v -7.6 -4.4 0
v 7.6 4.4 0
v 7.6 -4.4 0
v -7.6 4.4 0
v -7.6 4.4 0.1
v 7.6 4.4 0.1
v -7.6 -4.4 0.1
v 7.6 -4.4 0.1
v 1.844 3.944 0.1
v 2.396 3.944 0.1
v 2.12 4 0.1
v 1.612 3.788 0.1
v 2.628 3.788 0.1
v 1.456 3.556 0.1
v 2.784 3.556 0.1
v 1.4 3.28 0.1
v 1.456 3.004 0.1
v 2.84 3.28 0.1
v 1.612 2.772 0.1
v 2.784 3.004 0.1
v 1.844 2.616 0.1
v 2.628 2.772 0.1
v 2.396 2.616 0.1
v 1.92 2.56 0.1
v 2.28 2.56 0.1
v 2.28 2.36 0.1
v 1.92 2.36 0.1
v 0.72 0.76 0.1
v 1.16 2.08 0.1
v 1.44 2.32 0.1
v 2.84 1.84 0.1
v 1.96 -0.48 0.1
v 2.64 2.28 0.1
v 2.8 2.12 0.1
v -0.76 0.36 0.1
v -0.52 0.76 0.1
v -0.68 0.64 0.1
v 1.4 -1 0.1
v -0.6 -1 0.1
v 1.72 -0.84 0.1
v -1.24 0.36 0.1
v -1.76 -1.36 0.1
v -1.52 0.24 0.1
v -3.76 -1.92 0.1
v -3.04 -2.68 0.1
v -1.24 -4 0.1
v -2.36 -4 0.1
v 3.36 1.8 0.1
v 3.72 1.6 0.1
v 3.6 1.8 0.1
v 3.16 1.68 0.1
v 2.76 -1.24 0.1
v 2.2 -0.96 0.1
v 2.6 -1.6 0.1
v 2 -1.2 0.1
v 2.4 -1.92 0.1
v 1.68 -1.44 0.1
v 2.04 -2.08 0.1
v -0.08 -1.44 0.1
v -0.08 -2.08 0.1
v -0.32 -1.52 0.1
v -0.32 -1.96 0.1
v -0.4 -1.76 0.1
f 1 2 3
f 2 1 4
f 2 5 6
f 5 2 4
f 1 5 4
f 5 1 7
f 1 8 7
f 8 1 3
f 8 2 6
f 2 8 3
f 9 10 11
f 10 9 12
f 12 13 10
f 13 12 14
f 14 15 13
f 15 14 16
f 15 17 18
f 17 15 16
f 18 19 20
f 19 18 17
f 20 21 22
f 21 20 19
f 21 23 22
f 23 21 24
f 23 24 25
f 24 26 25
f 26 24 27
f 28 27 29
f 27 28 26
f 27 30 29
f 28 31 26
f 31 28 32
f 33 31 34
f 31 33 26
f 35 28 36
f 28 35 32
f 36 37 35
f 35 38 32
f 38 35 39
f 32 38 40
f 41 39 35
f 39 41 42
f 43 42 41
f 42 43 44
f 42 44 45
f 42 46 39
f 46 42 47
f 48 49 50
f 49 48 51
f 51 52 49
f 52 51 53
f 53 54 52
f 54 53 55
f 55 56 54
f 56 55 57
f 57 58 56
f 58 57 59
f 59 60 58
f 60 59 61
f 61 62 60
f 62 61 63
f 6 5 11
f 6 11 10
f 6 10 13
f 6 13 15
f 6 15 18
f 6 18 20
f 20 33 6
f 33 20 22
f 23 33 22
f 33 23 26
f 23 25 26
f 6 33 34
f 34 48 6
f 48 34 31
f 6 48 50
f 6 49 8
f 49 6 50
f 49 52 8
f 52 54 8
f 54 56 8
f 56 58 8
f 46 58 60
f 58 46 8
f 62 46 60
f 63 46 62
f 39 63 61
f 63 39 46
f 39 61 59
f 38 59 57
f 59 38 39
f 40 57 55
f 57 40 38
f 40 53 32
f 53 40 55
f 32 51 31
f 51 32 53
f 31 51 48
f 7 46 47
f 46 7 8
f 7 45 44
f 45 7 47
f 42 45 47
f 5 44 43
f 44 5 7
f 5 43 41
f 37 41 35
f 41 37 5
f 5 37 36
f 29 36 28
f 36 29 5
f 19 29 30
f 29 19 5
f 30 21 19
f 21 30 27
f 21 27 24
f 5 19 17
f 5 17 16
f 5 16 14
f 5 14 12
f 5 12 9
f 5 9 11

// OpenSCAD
// file: ../p/box5-12.scad
use <../lib.scad>
function ldraw_lib__box5_12() = [
// 0 Box with 5 Faces without Any Edges
// 0 Name: box5-12.dat
// 0 Author: Chris Dee [cwdee]
// 0 !LDRAW_ORG Primitive UPDATE 2009-02
// 0 !LICENSE Licensed under CC BY 4.0 : see CAreadme.txt
// 
// 0 BFC CERTIFY CCW
  [0,"BFC","CERTIFY"],
  [0,"BFC","CCW"],
// 
// 0 !HISTORY 2009-09-03 [PTadmin] Official Update 2009-02
// 
// 
// 4 16 1 1 1 1 1 -1 -1 1 -1 -1 1 1
  [4,16,1,1,1,1,1,-1,-1,1,-1,-1,1,1],
// 4 16 -1 0 1 1 0 1 1 1 1 -1 1 1
  [4,16,-1,0,1,1,0,1,1,1,1,-1,1,1],
// 4 16 -1 0 -1 -1 0 1 -1 1 1 -1 1 -1
  [4,16,-1,0,-1,-1,0,1,-1,1,1,-1,1,-1],
// 4 16 1 0 -1 -1 0 -1 -1 1 -1 1 1 -1
  [4,16,1,0,-1,-1,0,-1,-1,1,-1,1,1,-1],
// 4 16 1 0 1 1 0 -1 1 1 -1 1 1 1
  [4,16,1,0,1,1,0,-1,1,1,-1,1,1,1],
// 0
];
module ldraw_lib__box5_12(step=0, col=false, unit=2/5, alt=false, line=0.2, solid=!$preview)
    makepoly(ldraw_lib__box5_12(), step=step, col=col, unit=unit, alt=alt, line=line, solid=solid);
ldraw_lib__box5_12(line=0.2);
// main file
use <../lib.scad>
use <../p/box5-12.scad>
function ldraw_lib__164555c() = [
// 0 Sticker  1.1 x  1.9 with Black Waiting Room Pictogram on Transparent Background
// 0 Name: 164555c.dat
// 0 Author: Takeshi Takahashi [RainbowDolphin]
// 0 !LDRAW_ORG Part UPDATE 2022-06
// 0 !LICENSE Licensed under CC BY 4.0 : see CAreadme.txt
// 
// 0 BFC CERTIFY CCW
  [0,"BFC","CERTIFY"],
  [0,"BFC","CCW"],
// 
// 0 !KEYWORDS Bricklink 4554stk01, Brickowl 156966, Rebrickable 164555, Set 4554
// 0 !KEYWORDS Station, Train
// 
// 0 !HISTORY 2022-12-20 [PTadmin] Official Update 2022-06
// 
// 
// 1 16 0 -0.25 0 19 0 0 0 0.25 0 0 0 11 box5-12.dat
  [1,16,0,-0.25,0,19,0,0,0,0.25,0,0,0,11, ldraw_lib__box5_12()],
// 0 BFC NOCLIP
  [0,"BFC","NOCLIP"],
// 4 0 5.99 -0.25 9.86 5.3 -0.25 10 4.61 -0.25 9.86 4.03 -0.25 9.47
  [4,0,5.99,-0.25,9.86,5.3,-0.25,10,4.61,-0.25,9.86,4.03,-0.25,9.47],
// 4 0 6.57 -0.25 9.47 5.99 -0.25 9.86 4.03 -0.25 9.47 3.64 -0.25 8.89
  [4,0,6.57,-0.25,9.47,5.99,-0.25,9.86,4.03,-0.25,9.47,3.64,-0.25,8.89],
// 4 0 6.96 -0.25 8.89 6.57 -0.25 9.47 3.64 -0.25 8.89 3.5 -0.25 8.2
  [4,0,6.96,-0.25,8.89,6.57,-0.25,9.47,3.64,-0.25,8.89,3.5,-0.25,8.2],
// 4 0 7.1 -0.25 8.2 6.96 -0.25 8.89 3.5 -0.25 8.2 3.64 -0.25 7.51
  [4,0,7.1,-0.25,8.2,6.96,-0.25,8.89,3.5,-0.25,8.2,3.64,-0.25,7.51],
// 4 0 6.96 -0.25 7.51 7.1 -0.25 8.2 3.64 -0.25 7.51 4.03 -0.25 6.93
  [4,0,6.96,-0.25,7.51,7.1,-0.25,8.2,3.64,-0.25,7.51,4.03,-0.25,6.93],
// 4 0 6.57 -0.25 6.93 6.96 -0.25 7.51 4.03 -0.25 6.93 4.61 -0.25 6.54
  [4,0,6.57,-0.25,6.93,6.96,-0.25,7.51,4.03,-0.25,6.93,4.61,-0.25,6.54],
// 4 0 5.99 -0.25 6.54 6.57 -0.25 6.93 4.61 -0.25 6.54 4.8 -0.25 6.4
  [4,0,5.99,-0.25,6.54,6.57,-0.25,6.93,4.61,-0.25,6.54,4.8,-0.25,6.4],
// 3 0 5.99 -0.25 6.54 4.8 -0.25 6.4 5.7 -0.25 6.4
  [3,0,5.99,-0.25,6.54,4.8,-0.25,6.4,5.7,-0.25,6.4],
// 4 0 5.7 -0.25 6.4 4.8 -0.25 6.4 4.8 -0.25 5.9 5.7 -0.25 5.9
  [4,0,5.7,-0.25,6.4,4.8,-0.25,6.4,4.8,-0.25,5.9,5.7,-0.25,5.9],
// 4 0 1.8 -0.25 1.9 5.7 -0.25 5.9 4.8 -0.25 5.9 2.9 -0.25 5.2
  [4,0,1.8,-0.25,1.9,5.7,-0.25,5.9,4.8,-0.25,5.9,2.9,-0.25,5.2],
// 3 0 4.8 -0.25 5.9 3.6 -0.25 5.8 2.9 -0.25 5.2
  [3,0,4.8,-0.25,5.9,3.6,-0.25,5.8,2.9,-0.25,5.2],
// 4 0 5.7 -0.25 5.9 1.8 -0.25 1.9 4.9 -0.25 -1.2 7.1 -0.25 4.6
  [4,0,5.7,-0.25,5.9,1.8,-0.25,1.9,4.9,-0.25,-1.2,7.1,-0.25,4.6],
// 4 0 5.7 -0.25 5.9 7.1 -0.25 4.6 7 -0.25 5.3 6.6 -0.25 5.7
  [4,0,5.7,-0.25,5.9,7.1,-0.25,4.6,7,-0.25,5.3,6.6,-0.25,5.7],
// 4 0 -1.9 -0.25 0.9 4.9 -0.25 -1.2 1.8 -0.25 1.9 -1.3 -0.25 1.9
  [4,0,-1.9,-0.25,0.9,4.9,-0.25,-1.2,1.8,-0.25,1.9,-1.3,-0.25,1.9],
// 3 0 -1.3 -0.25 1.9 -1.7 -0.25 1.6 -1.9 -0.25 0.9
  [3,0,-1.3,-0.25,1.9,-1.7,-0.25,1.6,-1.9,-0.25,0.9],
// 4 0 4.9 -0.25 -1.2 -1.9 -0.25 0.9 -1.5 -0.25 -2.5 3.5 -0.25 -2.5
  [4,0,4.9,-0.25,-1.2,-1.9,-0.25,0.9,-1.5,-0.25,-2.5,3.5,-0.25,-2.5],
// 3 0 4.9 -0.25 -1.2 3.5 -0.25 -2.5 4.3 -0.25 -2.1
  [3,0,4.9,-0.25,-1.2,3.5,-0.25,-2.5,4.3,-0.25,-2.1],
// 4 0 -4.4 -0.25 -3.4 -1.5 -0.25 -2.5 -1.9 -0.25 0.9 -3.1 -0.25 0.9
  [4,0,-4.4,-0.25,-3.4,-1.5,-0.25,-2.5,-1.9,-0.25,0.9,-3.1,-0.25,0.9],
// 4 0 -4.4 -0.25 -3.4 -3.1 -0.25 0.9 -3.8 -0.25 0.6 -9.4 -0.25 -4.8
  [4,0,-4.4,-0.25,-3.4,-3.1,-0.25,0.9,-3.8,-0.25,0.6,-9.4,-0.25,-4.8],
// 3 0 -4.4 -0.25 -3.4 -9.4 -0.25 -4.8 -7.6 -0.25 -6.7
  [3,0,-4.4,-0.25,-3.4,-9.4,-0.25,-4.8,-7.6,-0.25,-6.7],
// 4 0 -3.1 -0.25 -10 -1.5 -0.25 -2.5 -4.4 -0.25 -3.4 -5.9 -0.25 -10
  [4,0,-3.1,-0.25,-10,-1.5,-0.25,-2.5,-4.4,-0.25,-3.4,-5.9,-0.25,-10],
// 4 0 9.3 -0.25 4 9 -0.25 4.5 8.4 -0.25 4.5 7.9 -0.25 4.2
  [4,0,9.3,-0.25,4,9,-0.25,4.5,8.4,-0.25,4.5,7.9,-0.25,4.2],
// 4 0 9.3 -0.25 4 7.9 -0.25 4.2 5.5 -0.25 -2.4 6.9 -0.25 -3.1
  [4,0,9.3,-0.25,4,7.9,-0.25,4.2,5.5,-0.25,-2.4,6.9,-0.25,-3.1],
// 4 0 6.9 -0.25 -3.1 5.5 -0.25 -2.4 5 -0.25 -3 6.5 -0.25 -4
  [4,0,6.9,-0.25,-3.1,5.5,-0.25,-2.4,5,-0.25,-3,6.5,-0.25,-4],
// 4 0 6.5 -0.25 -4 5 -0.25 -3 4.2 -0.25 -3.6 6 -0.25 -4.8
  [4,0,6.5,-0.25,-4,5,-0.25,-3,4.2,-0.25,-3.6,6,-0.25,-4.8],
// 4 0 5.1 -0.25 -5.2 6 -0.25 -4.8 4.2 -0.25 -3.6 -0.2 -0.25 -3.6
  [4,0,5.1,-0.25,-5.2,6,-0.25,-4.8,4.2,-0.25,-3.6,-0.2,-0.25,-3.6],
// 4 0 -0.2 -0.25 -5.2 5.1 -0.25 -5.2 -0.2 -0.25 -3.6 -0.8 -0.25 -3.8
  [4,0,-0.2,-0.25,-5.2,5.1,-0.25,-5.2,-0.2,-0.25,-3.6,-0.8,-0.25,-3.8],
// 4 0 -0.8 -0.25 -4.9 -0.2 -0.25 -5.2 -0.8 -0.25 -3.8 -1 -0.25 -4.4
  [4,0,-0.8,-0.25,-4.9,-0.2,-0.25,-5.2,-0.8,-0.25,-3.8,-1,-0.25,-4.4],
// 0 BFC CLIP
  [0,"BFC","CLIP"],
// 3 16 19 -0.25 11 -19 -0.25 11 5.3 -0.25 10
  [3,16,19,-0.25,11,-19,-0.25,11,5.3,-0.25,10],
// 3 16 19 -0.25 11 5.3 -0.25 10 5.99 -0.25 9.86
  [3,16,19,-0.25,11,5.3,-0.25,10,5.99,-0.25,9.86],
// 3 16 19 -0.25 11 5.99 -0.25 9.86 6.57 -0.25 9.47
  [3,16,19,-0.25,11,5.99,-0.25,9.86,6.57,-0.25,9.47],
// 3 16 19 -0.25 11 6.57 -0.25 9.47 6.96 -0.25 8.89
  [3,16,19,-0.25,11,6.57,-0.25,9.47,6.96,-0.25,8.89],
// 3 16 19 -0.25 11 6.96 -0.25 8.89 7.1 -0.25 8.2
  [3,16,19,-0.25,11,6.96,-0.25,8.89,7.1,-0.25,8.2],
// 3 16 19 -0.25 11 7.1 -0.25 8.2 6.96 -0.25 7.51
  [3,16,19,-0.25,11,7.1,-0.25,8.2,6.96,-0.25,7.51],
// 4 16 19 -0.25 11 6.96 -0.25 7.51 6.57 -0.25 6.93 6.6 -0.25 5.7
  [4,16,19,-0.25,11,6.96,-0.25,7.51,6.57,-0.25,6.93,6.6,-0.25,5.7],
// 4 16 6.6 -0.25 5.7 6.57 -0.25 6.93 5.99 -0.25 6.54 5.7 -0.25 5.9
  [4,16,6.6,-0.25,5.7,6.57,-0.25,6.93,5.99,-0.25,6.54,5.7,-0.25,5.9],
// 3 16 5.99 -0.25 6.54 5.7 -0.25 6.4 5.7 -0.25 5.9
  [3,16,5.99,-0.25,6.54,5.7,-0.25,6.4,5.7,-0.25,5.9],
// 3 16 19 -0.25 11 6.6 -0.25 5.7 7 -0.25 5.3
  [3,16,19,-0.25,11,6.6,-0.25,5.7,7,-0.25,5.3],
// 4 16 19 -0.25 11 7 -0.25 5.3 7.1 -0.25 4.6 8.4 -0.25 4.5
  [4,16,19,-0.25,11,7,-0.25,5.3,7.1,-0.25,4.6,8.4,-0.25,4.5],
// 3 16 19 -0.25 11 8.4 -0.25 4.5 9 -0.25 4.5
  [3,16,19,-0.25,11,8.4,-0.25,4.5,9,-0.25,4.5],
// 4 16 19 -0.25 11 9 -0.25 4.5 9.3 -0.25 4 19 -0.25 -11
  [4,16,19,-0.25,11,9,-0.25,4.5,9.3,-0.25,4,19,-0.25,-11],
// 3 16 9.3 -0.25 4 6.9 -0.25 -3.1 19 -0.25 -11
  [3,16,9.3,-0.25,4,6.9,-0.25,-3.1,19,-0.25,-11],
// 3 16 6.9 -0.25 -3.1 6.5 -0.25 -4 19 -0.25 -11
  [3,16,6.9,-0.25,-3.1,6.5,-0.25,-4,19,-0.25,-11],
// 3 16 6.5 -0.25 -4 6 -0.25 -4.8 19 -0.25 -11
  [3,16,6.5,-0.25,-4,6,-0.25,-4.8,19,-0.25,-11],
// 3 16 6 -0.25 -4.8 5.1 -0.25 -5.2 19 -0.25 -11
  [3,16,6,-0.25,-4.8,5.1,-0.25,-5.2,19,-0.25,-11],
// 4 16 19 -0.25 -11 5.1 -0.25 -5.2 -0.2 -0.25 -5.2 -3.1 -0.25 -10
  [4,16,19,-0.25,-11,5.1,-0.25,-5.2,-0.2,-0.25,-5.2,-3.1,-0.25,-10],
// 3 16 -0.8 -0.25 -4.9 -3.1 -0.25 -10 -0.2 -0.25 -5.2
  [3,16,-0.8,-0.25,-4.9,-3.1,-0.25,-10,-0.2,-0.25,-5.2],
// 3 16 -1 -0.25 -4.4 -3.1 -0.25 -10 -0.8 -0.25 -4.9
  [3,16,-1,-0.25,-4.4,-3.1,-0.25,-10,-0.8,-0.25,-4.9],
// 4 16 -1.5 -0.25 -2.5 -3.1 -0.25 -10 -1 -0.25 -4.4 -0.8 -0.25 -3.8
  [4,16,-1.5,-0.25,-2.5,-3.1,-0.25,-10,-1,-0.25,-4.4,-0.8,-0.25,-3.8],
// 3 16 -1.5 -0.25 -2.5 -0.8 -0.25 -3.8 -0.2 -0.25 -3.6
  [3,16,-1.5,-0.25,-2.5,-0.8,-0.25,-3.8,-0.2,-0.25,-3.6],
// 4 16 3.5 -0.25 -2.5 -1.5 -0.25 -2.5 -0.2 -0.25 -3.6 4.2 -0.25 -3.6
  [4,16,3.5,-0.25,-2.5,-1.5,-0.25,-2.5,-0.2,-0.25,-3.6,4.2,-0.25,-3.6],
// 4 16 4.3 -0.25 -2.1 3.5 -0.25 -2.5 4.2 -0.25 -3.6 5 -0.25 -3
  [4,16,4.3,-0.25,-2.1,3.5,-0.25,-2.5,4.2,-0.25,-3.6,5,-0.25,-3],
// 4 16 4.3 -0.25 -2.1 5 -0.25 -3 5.5 -0.25 -2.4 4.9 -0.25 -1.2
  [4,16,4.3,-0.25,-2.1,5,-0.25,-3,5.5,-0.25,-2.4,4.9,-0.25,-1.2],
// 4 16 4.9 -0.25 -1.2 5.5 -0.25 -2.4 7.9 -0.25 4.2 7.1 -0.25 4.6
  [4,16,4.9,-0.25,-1.2,5.5,-0.25,-2.4,7.9,-0.25,4.2,7.1,-0.25,4.6],
// 3 16 7.1 -0.25 4.6 7.9 -0.25 4.2 8.4 -0.25 4.5
  [3,16,7.1,-0.25,4.6,7.9,-0.25,4.2,8.4,-0.25,4.5],
// 4 16 -19 -0.25 -11 19 -0.25 -11 -3.1 -0.25 -10 -5.9 -0.25 -10
  [4,16,-19,-0.25,-11,19,-0.25,-11,-3.1,-0.25,-10,-5.9,-0.25,-10],
// 4 16 -19 -0.25 -11 -5.9 -0.25 -10 -7.6 -0.25 -6.7 -9.4 -0.25 -4.8
  [4,16,-19,-0.25,-11,-5.9,-0.25,-10,-7.6,-0.25,-6.7,-9.4,-0.25,-4.8],
// 3 16 -4.4 -0.25 -3.4 -7.6 -0.25 -6.7 -5.9 -0.25 -10
  [3,16,-4.4,-0.25,-3.4,-7.6,-0.25,-6.7,-5.9,-0.25,-10],
// 4 16 -19 -0.25 11 -19 -0.25 -11 -9.4 -0.25 -4.8 -3.8 -0.25 0.6
  [4,16,-19,-0.25,11,-19,-0.25,-11,-9.4,-0.25,-4.8,-3.8,-0.25,0.6],
// 3 16 -19 -0.25 11 -3.8 -0.25 0.6 -3.1 -0.25 0.9
  [3,16,-19,-0.25,11,-3.8,-0.25,0.6,-3.1,-0.25,0.9],
// 4 16 -19 -0.25 11 -3.1 -0.25 0.9 -1.9 -0.25 0.9 -1.7 -0.25 1.6
  [4,16,-19,-0.25,11,-3.1,-0.25,0.9,-1.9,-0.25,0.9,-1.7,-0.25,1.6],
// 3 16 -19 -0.25 11 -1.7 -0.25 1.6 -1.3 -0.25 1.9
  [3,16,-19,-0.25,11,-1.7,-0.25,1.6,-1.3,-0.25,1.9],
// 4 16 -19 -0.25 11 -1.3 -0.25 1.9 1.8 -0.25 1.9 2.9 -0.25 5.2
  [4,16,-19,-0.25,11,-1.3,-0.25,1.9,1.8,-0.25,1.9,2.9,-0.25,5.2],
// 4 16 -19 -0.25 11 2.9 -0.25 5.2 3.6 -0.25 5.8 4.03 -0.25 6.93
  [4,16,-19,-0.25,11,2.9,-0.25,5.2,3.6,-0.25,5.8,4.03,-0.25,6.93],
// 4 16 4.61 -0.25 6.54 4.03 -0.25 6.93 3.6 -0.25 5.8 4.8 -0.25 5.9
  [4,16,4.61,-0.25,6.54,4.03,-0.25,6.93,3.6,-0.25,5.8,4.8,-0.25,5.9],
// 3 16 4.61 -0.25 6.54 4.8 -0.25 5.9 4.8 -0.25 6.4
  [3,16,4.61,-0.25,6.54,4.8,-0.25,5.9,4.8,-0.25,6.4],
// 3 16 -19 -0.25 11 4.03 -0.25 6.93 3.64 -0.25 7.51
  [3,16,-19,-0.25,11,4.03,-0.25,6.93,3.64,-0.25,7.51],
// 3 16 -19 -0.25 11 3.64 -0.25 7.51 3.5 -0.25 8.2
  [3,16,-19,-0.25,11,3.64,-0.25,7.51,3.5,-0.25,8.2],
// 3 16 -19 -0.25 11 3.5 -0.25 8.2 3.64 -0.25 8.89
  [3,16,-19,-0.25,11,3.5,-0.25,8.2,3.64,-0.25,8.89],
// 3 16 -19 -0.25 11 3.64 -0.25 8.89 4.03 -0.25 9.47
  [3,16,-19,-0.25,11,3.64,-0.25,8.89,4.03,-0.25,9.47],
// 3 16 -19 -0.25 11 4.03 -0.25 9.47 4.61 -0.25 9.86
  [3,16,-19,-0.25,11,4.03,-0.25,9.47,4.61,-0.25,9.86],
// 3 16 -19 -0.25 11 4.61 -0.25 9.86 5.3 -0.25 10
  [3,16,-19,-0.25,11,4.61,-0.25,9.86,5.3,-0.25,10],
];
module ldraw_lib__164555c(step=0, col=false, unit=2/5, alt=false, line=0.2, solid=!$preview)
    makepoly(ldraw_lib__164555c(), step=step, col=col, unit=unit, alt=alt, line=line, solid=solid);
ldraw_lib__164555c(line=0.2);
